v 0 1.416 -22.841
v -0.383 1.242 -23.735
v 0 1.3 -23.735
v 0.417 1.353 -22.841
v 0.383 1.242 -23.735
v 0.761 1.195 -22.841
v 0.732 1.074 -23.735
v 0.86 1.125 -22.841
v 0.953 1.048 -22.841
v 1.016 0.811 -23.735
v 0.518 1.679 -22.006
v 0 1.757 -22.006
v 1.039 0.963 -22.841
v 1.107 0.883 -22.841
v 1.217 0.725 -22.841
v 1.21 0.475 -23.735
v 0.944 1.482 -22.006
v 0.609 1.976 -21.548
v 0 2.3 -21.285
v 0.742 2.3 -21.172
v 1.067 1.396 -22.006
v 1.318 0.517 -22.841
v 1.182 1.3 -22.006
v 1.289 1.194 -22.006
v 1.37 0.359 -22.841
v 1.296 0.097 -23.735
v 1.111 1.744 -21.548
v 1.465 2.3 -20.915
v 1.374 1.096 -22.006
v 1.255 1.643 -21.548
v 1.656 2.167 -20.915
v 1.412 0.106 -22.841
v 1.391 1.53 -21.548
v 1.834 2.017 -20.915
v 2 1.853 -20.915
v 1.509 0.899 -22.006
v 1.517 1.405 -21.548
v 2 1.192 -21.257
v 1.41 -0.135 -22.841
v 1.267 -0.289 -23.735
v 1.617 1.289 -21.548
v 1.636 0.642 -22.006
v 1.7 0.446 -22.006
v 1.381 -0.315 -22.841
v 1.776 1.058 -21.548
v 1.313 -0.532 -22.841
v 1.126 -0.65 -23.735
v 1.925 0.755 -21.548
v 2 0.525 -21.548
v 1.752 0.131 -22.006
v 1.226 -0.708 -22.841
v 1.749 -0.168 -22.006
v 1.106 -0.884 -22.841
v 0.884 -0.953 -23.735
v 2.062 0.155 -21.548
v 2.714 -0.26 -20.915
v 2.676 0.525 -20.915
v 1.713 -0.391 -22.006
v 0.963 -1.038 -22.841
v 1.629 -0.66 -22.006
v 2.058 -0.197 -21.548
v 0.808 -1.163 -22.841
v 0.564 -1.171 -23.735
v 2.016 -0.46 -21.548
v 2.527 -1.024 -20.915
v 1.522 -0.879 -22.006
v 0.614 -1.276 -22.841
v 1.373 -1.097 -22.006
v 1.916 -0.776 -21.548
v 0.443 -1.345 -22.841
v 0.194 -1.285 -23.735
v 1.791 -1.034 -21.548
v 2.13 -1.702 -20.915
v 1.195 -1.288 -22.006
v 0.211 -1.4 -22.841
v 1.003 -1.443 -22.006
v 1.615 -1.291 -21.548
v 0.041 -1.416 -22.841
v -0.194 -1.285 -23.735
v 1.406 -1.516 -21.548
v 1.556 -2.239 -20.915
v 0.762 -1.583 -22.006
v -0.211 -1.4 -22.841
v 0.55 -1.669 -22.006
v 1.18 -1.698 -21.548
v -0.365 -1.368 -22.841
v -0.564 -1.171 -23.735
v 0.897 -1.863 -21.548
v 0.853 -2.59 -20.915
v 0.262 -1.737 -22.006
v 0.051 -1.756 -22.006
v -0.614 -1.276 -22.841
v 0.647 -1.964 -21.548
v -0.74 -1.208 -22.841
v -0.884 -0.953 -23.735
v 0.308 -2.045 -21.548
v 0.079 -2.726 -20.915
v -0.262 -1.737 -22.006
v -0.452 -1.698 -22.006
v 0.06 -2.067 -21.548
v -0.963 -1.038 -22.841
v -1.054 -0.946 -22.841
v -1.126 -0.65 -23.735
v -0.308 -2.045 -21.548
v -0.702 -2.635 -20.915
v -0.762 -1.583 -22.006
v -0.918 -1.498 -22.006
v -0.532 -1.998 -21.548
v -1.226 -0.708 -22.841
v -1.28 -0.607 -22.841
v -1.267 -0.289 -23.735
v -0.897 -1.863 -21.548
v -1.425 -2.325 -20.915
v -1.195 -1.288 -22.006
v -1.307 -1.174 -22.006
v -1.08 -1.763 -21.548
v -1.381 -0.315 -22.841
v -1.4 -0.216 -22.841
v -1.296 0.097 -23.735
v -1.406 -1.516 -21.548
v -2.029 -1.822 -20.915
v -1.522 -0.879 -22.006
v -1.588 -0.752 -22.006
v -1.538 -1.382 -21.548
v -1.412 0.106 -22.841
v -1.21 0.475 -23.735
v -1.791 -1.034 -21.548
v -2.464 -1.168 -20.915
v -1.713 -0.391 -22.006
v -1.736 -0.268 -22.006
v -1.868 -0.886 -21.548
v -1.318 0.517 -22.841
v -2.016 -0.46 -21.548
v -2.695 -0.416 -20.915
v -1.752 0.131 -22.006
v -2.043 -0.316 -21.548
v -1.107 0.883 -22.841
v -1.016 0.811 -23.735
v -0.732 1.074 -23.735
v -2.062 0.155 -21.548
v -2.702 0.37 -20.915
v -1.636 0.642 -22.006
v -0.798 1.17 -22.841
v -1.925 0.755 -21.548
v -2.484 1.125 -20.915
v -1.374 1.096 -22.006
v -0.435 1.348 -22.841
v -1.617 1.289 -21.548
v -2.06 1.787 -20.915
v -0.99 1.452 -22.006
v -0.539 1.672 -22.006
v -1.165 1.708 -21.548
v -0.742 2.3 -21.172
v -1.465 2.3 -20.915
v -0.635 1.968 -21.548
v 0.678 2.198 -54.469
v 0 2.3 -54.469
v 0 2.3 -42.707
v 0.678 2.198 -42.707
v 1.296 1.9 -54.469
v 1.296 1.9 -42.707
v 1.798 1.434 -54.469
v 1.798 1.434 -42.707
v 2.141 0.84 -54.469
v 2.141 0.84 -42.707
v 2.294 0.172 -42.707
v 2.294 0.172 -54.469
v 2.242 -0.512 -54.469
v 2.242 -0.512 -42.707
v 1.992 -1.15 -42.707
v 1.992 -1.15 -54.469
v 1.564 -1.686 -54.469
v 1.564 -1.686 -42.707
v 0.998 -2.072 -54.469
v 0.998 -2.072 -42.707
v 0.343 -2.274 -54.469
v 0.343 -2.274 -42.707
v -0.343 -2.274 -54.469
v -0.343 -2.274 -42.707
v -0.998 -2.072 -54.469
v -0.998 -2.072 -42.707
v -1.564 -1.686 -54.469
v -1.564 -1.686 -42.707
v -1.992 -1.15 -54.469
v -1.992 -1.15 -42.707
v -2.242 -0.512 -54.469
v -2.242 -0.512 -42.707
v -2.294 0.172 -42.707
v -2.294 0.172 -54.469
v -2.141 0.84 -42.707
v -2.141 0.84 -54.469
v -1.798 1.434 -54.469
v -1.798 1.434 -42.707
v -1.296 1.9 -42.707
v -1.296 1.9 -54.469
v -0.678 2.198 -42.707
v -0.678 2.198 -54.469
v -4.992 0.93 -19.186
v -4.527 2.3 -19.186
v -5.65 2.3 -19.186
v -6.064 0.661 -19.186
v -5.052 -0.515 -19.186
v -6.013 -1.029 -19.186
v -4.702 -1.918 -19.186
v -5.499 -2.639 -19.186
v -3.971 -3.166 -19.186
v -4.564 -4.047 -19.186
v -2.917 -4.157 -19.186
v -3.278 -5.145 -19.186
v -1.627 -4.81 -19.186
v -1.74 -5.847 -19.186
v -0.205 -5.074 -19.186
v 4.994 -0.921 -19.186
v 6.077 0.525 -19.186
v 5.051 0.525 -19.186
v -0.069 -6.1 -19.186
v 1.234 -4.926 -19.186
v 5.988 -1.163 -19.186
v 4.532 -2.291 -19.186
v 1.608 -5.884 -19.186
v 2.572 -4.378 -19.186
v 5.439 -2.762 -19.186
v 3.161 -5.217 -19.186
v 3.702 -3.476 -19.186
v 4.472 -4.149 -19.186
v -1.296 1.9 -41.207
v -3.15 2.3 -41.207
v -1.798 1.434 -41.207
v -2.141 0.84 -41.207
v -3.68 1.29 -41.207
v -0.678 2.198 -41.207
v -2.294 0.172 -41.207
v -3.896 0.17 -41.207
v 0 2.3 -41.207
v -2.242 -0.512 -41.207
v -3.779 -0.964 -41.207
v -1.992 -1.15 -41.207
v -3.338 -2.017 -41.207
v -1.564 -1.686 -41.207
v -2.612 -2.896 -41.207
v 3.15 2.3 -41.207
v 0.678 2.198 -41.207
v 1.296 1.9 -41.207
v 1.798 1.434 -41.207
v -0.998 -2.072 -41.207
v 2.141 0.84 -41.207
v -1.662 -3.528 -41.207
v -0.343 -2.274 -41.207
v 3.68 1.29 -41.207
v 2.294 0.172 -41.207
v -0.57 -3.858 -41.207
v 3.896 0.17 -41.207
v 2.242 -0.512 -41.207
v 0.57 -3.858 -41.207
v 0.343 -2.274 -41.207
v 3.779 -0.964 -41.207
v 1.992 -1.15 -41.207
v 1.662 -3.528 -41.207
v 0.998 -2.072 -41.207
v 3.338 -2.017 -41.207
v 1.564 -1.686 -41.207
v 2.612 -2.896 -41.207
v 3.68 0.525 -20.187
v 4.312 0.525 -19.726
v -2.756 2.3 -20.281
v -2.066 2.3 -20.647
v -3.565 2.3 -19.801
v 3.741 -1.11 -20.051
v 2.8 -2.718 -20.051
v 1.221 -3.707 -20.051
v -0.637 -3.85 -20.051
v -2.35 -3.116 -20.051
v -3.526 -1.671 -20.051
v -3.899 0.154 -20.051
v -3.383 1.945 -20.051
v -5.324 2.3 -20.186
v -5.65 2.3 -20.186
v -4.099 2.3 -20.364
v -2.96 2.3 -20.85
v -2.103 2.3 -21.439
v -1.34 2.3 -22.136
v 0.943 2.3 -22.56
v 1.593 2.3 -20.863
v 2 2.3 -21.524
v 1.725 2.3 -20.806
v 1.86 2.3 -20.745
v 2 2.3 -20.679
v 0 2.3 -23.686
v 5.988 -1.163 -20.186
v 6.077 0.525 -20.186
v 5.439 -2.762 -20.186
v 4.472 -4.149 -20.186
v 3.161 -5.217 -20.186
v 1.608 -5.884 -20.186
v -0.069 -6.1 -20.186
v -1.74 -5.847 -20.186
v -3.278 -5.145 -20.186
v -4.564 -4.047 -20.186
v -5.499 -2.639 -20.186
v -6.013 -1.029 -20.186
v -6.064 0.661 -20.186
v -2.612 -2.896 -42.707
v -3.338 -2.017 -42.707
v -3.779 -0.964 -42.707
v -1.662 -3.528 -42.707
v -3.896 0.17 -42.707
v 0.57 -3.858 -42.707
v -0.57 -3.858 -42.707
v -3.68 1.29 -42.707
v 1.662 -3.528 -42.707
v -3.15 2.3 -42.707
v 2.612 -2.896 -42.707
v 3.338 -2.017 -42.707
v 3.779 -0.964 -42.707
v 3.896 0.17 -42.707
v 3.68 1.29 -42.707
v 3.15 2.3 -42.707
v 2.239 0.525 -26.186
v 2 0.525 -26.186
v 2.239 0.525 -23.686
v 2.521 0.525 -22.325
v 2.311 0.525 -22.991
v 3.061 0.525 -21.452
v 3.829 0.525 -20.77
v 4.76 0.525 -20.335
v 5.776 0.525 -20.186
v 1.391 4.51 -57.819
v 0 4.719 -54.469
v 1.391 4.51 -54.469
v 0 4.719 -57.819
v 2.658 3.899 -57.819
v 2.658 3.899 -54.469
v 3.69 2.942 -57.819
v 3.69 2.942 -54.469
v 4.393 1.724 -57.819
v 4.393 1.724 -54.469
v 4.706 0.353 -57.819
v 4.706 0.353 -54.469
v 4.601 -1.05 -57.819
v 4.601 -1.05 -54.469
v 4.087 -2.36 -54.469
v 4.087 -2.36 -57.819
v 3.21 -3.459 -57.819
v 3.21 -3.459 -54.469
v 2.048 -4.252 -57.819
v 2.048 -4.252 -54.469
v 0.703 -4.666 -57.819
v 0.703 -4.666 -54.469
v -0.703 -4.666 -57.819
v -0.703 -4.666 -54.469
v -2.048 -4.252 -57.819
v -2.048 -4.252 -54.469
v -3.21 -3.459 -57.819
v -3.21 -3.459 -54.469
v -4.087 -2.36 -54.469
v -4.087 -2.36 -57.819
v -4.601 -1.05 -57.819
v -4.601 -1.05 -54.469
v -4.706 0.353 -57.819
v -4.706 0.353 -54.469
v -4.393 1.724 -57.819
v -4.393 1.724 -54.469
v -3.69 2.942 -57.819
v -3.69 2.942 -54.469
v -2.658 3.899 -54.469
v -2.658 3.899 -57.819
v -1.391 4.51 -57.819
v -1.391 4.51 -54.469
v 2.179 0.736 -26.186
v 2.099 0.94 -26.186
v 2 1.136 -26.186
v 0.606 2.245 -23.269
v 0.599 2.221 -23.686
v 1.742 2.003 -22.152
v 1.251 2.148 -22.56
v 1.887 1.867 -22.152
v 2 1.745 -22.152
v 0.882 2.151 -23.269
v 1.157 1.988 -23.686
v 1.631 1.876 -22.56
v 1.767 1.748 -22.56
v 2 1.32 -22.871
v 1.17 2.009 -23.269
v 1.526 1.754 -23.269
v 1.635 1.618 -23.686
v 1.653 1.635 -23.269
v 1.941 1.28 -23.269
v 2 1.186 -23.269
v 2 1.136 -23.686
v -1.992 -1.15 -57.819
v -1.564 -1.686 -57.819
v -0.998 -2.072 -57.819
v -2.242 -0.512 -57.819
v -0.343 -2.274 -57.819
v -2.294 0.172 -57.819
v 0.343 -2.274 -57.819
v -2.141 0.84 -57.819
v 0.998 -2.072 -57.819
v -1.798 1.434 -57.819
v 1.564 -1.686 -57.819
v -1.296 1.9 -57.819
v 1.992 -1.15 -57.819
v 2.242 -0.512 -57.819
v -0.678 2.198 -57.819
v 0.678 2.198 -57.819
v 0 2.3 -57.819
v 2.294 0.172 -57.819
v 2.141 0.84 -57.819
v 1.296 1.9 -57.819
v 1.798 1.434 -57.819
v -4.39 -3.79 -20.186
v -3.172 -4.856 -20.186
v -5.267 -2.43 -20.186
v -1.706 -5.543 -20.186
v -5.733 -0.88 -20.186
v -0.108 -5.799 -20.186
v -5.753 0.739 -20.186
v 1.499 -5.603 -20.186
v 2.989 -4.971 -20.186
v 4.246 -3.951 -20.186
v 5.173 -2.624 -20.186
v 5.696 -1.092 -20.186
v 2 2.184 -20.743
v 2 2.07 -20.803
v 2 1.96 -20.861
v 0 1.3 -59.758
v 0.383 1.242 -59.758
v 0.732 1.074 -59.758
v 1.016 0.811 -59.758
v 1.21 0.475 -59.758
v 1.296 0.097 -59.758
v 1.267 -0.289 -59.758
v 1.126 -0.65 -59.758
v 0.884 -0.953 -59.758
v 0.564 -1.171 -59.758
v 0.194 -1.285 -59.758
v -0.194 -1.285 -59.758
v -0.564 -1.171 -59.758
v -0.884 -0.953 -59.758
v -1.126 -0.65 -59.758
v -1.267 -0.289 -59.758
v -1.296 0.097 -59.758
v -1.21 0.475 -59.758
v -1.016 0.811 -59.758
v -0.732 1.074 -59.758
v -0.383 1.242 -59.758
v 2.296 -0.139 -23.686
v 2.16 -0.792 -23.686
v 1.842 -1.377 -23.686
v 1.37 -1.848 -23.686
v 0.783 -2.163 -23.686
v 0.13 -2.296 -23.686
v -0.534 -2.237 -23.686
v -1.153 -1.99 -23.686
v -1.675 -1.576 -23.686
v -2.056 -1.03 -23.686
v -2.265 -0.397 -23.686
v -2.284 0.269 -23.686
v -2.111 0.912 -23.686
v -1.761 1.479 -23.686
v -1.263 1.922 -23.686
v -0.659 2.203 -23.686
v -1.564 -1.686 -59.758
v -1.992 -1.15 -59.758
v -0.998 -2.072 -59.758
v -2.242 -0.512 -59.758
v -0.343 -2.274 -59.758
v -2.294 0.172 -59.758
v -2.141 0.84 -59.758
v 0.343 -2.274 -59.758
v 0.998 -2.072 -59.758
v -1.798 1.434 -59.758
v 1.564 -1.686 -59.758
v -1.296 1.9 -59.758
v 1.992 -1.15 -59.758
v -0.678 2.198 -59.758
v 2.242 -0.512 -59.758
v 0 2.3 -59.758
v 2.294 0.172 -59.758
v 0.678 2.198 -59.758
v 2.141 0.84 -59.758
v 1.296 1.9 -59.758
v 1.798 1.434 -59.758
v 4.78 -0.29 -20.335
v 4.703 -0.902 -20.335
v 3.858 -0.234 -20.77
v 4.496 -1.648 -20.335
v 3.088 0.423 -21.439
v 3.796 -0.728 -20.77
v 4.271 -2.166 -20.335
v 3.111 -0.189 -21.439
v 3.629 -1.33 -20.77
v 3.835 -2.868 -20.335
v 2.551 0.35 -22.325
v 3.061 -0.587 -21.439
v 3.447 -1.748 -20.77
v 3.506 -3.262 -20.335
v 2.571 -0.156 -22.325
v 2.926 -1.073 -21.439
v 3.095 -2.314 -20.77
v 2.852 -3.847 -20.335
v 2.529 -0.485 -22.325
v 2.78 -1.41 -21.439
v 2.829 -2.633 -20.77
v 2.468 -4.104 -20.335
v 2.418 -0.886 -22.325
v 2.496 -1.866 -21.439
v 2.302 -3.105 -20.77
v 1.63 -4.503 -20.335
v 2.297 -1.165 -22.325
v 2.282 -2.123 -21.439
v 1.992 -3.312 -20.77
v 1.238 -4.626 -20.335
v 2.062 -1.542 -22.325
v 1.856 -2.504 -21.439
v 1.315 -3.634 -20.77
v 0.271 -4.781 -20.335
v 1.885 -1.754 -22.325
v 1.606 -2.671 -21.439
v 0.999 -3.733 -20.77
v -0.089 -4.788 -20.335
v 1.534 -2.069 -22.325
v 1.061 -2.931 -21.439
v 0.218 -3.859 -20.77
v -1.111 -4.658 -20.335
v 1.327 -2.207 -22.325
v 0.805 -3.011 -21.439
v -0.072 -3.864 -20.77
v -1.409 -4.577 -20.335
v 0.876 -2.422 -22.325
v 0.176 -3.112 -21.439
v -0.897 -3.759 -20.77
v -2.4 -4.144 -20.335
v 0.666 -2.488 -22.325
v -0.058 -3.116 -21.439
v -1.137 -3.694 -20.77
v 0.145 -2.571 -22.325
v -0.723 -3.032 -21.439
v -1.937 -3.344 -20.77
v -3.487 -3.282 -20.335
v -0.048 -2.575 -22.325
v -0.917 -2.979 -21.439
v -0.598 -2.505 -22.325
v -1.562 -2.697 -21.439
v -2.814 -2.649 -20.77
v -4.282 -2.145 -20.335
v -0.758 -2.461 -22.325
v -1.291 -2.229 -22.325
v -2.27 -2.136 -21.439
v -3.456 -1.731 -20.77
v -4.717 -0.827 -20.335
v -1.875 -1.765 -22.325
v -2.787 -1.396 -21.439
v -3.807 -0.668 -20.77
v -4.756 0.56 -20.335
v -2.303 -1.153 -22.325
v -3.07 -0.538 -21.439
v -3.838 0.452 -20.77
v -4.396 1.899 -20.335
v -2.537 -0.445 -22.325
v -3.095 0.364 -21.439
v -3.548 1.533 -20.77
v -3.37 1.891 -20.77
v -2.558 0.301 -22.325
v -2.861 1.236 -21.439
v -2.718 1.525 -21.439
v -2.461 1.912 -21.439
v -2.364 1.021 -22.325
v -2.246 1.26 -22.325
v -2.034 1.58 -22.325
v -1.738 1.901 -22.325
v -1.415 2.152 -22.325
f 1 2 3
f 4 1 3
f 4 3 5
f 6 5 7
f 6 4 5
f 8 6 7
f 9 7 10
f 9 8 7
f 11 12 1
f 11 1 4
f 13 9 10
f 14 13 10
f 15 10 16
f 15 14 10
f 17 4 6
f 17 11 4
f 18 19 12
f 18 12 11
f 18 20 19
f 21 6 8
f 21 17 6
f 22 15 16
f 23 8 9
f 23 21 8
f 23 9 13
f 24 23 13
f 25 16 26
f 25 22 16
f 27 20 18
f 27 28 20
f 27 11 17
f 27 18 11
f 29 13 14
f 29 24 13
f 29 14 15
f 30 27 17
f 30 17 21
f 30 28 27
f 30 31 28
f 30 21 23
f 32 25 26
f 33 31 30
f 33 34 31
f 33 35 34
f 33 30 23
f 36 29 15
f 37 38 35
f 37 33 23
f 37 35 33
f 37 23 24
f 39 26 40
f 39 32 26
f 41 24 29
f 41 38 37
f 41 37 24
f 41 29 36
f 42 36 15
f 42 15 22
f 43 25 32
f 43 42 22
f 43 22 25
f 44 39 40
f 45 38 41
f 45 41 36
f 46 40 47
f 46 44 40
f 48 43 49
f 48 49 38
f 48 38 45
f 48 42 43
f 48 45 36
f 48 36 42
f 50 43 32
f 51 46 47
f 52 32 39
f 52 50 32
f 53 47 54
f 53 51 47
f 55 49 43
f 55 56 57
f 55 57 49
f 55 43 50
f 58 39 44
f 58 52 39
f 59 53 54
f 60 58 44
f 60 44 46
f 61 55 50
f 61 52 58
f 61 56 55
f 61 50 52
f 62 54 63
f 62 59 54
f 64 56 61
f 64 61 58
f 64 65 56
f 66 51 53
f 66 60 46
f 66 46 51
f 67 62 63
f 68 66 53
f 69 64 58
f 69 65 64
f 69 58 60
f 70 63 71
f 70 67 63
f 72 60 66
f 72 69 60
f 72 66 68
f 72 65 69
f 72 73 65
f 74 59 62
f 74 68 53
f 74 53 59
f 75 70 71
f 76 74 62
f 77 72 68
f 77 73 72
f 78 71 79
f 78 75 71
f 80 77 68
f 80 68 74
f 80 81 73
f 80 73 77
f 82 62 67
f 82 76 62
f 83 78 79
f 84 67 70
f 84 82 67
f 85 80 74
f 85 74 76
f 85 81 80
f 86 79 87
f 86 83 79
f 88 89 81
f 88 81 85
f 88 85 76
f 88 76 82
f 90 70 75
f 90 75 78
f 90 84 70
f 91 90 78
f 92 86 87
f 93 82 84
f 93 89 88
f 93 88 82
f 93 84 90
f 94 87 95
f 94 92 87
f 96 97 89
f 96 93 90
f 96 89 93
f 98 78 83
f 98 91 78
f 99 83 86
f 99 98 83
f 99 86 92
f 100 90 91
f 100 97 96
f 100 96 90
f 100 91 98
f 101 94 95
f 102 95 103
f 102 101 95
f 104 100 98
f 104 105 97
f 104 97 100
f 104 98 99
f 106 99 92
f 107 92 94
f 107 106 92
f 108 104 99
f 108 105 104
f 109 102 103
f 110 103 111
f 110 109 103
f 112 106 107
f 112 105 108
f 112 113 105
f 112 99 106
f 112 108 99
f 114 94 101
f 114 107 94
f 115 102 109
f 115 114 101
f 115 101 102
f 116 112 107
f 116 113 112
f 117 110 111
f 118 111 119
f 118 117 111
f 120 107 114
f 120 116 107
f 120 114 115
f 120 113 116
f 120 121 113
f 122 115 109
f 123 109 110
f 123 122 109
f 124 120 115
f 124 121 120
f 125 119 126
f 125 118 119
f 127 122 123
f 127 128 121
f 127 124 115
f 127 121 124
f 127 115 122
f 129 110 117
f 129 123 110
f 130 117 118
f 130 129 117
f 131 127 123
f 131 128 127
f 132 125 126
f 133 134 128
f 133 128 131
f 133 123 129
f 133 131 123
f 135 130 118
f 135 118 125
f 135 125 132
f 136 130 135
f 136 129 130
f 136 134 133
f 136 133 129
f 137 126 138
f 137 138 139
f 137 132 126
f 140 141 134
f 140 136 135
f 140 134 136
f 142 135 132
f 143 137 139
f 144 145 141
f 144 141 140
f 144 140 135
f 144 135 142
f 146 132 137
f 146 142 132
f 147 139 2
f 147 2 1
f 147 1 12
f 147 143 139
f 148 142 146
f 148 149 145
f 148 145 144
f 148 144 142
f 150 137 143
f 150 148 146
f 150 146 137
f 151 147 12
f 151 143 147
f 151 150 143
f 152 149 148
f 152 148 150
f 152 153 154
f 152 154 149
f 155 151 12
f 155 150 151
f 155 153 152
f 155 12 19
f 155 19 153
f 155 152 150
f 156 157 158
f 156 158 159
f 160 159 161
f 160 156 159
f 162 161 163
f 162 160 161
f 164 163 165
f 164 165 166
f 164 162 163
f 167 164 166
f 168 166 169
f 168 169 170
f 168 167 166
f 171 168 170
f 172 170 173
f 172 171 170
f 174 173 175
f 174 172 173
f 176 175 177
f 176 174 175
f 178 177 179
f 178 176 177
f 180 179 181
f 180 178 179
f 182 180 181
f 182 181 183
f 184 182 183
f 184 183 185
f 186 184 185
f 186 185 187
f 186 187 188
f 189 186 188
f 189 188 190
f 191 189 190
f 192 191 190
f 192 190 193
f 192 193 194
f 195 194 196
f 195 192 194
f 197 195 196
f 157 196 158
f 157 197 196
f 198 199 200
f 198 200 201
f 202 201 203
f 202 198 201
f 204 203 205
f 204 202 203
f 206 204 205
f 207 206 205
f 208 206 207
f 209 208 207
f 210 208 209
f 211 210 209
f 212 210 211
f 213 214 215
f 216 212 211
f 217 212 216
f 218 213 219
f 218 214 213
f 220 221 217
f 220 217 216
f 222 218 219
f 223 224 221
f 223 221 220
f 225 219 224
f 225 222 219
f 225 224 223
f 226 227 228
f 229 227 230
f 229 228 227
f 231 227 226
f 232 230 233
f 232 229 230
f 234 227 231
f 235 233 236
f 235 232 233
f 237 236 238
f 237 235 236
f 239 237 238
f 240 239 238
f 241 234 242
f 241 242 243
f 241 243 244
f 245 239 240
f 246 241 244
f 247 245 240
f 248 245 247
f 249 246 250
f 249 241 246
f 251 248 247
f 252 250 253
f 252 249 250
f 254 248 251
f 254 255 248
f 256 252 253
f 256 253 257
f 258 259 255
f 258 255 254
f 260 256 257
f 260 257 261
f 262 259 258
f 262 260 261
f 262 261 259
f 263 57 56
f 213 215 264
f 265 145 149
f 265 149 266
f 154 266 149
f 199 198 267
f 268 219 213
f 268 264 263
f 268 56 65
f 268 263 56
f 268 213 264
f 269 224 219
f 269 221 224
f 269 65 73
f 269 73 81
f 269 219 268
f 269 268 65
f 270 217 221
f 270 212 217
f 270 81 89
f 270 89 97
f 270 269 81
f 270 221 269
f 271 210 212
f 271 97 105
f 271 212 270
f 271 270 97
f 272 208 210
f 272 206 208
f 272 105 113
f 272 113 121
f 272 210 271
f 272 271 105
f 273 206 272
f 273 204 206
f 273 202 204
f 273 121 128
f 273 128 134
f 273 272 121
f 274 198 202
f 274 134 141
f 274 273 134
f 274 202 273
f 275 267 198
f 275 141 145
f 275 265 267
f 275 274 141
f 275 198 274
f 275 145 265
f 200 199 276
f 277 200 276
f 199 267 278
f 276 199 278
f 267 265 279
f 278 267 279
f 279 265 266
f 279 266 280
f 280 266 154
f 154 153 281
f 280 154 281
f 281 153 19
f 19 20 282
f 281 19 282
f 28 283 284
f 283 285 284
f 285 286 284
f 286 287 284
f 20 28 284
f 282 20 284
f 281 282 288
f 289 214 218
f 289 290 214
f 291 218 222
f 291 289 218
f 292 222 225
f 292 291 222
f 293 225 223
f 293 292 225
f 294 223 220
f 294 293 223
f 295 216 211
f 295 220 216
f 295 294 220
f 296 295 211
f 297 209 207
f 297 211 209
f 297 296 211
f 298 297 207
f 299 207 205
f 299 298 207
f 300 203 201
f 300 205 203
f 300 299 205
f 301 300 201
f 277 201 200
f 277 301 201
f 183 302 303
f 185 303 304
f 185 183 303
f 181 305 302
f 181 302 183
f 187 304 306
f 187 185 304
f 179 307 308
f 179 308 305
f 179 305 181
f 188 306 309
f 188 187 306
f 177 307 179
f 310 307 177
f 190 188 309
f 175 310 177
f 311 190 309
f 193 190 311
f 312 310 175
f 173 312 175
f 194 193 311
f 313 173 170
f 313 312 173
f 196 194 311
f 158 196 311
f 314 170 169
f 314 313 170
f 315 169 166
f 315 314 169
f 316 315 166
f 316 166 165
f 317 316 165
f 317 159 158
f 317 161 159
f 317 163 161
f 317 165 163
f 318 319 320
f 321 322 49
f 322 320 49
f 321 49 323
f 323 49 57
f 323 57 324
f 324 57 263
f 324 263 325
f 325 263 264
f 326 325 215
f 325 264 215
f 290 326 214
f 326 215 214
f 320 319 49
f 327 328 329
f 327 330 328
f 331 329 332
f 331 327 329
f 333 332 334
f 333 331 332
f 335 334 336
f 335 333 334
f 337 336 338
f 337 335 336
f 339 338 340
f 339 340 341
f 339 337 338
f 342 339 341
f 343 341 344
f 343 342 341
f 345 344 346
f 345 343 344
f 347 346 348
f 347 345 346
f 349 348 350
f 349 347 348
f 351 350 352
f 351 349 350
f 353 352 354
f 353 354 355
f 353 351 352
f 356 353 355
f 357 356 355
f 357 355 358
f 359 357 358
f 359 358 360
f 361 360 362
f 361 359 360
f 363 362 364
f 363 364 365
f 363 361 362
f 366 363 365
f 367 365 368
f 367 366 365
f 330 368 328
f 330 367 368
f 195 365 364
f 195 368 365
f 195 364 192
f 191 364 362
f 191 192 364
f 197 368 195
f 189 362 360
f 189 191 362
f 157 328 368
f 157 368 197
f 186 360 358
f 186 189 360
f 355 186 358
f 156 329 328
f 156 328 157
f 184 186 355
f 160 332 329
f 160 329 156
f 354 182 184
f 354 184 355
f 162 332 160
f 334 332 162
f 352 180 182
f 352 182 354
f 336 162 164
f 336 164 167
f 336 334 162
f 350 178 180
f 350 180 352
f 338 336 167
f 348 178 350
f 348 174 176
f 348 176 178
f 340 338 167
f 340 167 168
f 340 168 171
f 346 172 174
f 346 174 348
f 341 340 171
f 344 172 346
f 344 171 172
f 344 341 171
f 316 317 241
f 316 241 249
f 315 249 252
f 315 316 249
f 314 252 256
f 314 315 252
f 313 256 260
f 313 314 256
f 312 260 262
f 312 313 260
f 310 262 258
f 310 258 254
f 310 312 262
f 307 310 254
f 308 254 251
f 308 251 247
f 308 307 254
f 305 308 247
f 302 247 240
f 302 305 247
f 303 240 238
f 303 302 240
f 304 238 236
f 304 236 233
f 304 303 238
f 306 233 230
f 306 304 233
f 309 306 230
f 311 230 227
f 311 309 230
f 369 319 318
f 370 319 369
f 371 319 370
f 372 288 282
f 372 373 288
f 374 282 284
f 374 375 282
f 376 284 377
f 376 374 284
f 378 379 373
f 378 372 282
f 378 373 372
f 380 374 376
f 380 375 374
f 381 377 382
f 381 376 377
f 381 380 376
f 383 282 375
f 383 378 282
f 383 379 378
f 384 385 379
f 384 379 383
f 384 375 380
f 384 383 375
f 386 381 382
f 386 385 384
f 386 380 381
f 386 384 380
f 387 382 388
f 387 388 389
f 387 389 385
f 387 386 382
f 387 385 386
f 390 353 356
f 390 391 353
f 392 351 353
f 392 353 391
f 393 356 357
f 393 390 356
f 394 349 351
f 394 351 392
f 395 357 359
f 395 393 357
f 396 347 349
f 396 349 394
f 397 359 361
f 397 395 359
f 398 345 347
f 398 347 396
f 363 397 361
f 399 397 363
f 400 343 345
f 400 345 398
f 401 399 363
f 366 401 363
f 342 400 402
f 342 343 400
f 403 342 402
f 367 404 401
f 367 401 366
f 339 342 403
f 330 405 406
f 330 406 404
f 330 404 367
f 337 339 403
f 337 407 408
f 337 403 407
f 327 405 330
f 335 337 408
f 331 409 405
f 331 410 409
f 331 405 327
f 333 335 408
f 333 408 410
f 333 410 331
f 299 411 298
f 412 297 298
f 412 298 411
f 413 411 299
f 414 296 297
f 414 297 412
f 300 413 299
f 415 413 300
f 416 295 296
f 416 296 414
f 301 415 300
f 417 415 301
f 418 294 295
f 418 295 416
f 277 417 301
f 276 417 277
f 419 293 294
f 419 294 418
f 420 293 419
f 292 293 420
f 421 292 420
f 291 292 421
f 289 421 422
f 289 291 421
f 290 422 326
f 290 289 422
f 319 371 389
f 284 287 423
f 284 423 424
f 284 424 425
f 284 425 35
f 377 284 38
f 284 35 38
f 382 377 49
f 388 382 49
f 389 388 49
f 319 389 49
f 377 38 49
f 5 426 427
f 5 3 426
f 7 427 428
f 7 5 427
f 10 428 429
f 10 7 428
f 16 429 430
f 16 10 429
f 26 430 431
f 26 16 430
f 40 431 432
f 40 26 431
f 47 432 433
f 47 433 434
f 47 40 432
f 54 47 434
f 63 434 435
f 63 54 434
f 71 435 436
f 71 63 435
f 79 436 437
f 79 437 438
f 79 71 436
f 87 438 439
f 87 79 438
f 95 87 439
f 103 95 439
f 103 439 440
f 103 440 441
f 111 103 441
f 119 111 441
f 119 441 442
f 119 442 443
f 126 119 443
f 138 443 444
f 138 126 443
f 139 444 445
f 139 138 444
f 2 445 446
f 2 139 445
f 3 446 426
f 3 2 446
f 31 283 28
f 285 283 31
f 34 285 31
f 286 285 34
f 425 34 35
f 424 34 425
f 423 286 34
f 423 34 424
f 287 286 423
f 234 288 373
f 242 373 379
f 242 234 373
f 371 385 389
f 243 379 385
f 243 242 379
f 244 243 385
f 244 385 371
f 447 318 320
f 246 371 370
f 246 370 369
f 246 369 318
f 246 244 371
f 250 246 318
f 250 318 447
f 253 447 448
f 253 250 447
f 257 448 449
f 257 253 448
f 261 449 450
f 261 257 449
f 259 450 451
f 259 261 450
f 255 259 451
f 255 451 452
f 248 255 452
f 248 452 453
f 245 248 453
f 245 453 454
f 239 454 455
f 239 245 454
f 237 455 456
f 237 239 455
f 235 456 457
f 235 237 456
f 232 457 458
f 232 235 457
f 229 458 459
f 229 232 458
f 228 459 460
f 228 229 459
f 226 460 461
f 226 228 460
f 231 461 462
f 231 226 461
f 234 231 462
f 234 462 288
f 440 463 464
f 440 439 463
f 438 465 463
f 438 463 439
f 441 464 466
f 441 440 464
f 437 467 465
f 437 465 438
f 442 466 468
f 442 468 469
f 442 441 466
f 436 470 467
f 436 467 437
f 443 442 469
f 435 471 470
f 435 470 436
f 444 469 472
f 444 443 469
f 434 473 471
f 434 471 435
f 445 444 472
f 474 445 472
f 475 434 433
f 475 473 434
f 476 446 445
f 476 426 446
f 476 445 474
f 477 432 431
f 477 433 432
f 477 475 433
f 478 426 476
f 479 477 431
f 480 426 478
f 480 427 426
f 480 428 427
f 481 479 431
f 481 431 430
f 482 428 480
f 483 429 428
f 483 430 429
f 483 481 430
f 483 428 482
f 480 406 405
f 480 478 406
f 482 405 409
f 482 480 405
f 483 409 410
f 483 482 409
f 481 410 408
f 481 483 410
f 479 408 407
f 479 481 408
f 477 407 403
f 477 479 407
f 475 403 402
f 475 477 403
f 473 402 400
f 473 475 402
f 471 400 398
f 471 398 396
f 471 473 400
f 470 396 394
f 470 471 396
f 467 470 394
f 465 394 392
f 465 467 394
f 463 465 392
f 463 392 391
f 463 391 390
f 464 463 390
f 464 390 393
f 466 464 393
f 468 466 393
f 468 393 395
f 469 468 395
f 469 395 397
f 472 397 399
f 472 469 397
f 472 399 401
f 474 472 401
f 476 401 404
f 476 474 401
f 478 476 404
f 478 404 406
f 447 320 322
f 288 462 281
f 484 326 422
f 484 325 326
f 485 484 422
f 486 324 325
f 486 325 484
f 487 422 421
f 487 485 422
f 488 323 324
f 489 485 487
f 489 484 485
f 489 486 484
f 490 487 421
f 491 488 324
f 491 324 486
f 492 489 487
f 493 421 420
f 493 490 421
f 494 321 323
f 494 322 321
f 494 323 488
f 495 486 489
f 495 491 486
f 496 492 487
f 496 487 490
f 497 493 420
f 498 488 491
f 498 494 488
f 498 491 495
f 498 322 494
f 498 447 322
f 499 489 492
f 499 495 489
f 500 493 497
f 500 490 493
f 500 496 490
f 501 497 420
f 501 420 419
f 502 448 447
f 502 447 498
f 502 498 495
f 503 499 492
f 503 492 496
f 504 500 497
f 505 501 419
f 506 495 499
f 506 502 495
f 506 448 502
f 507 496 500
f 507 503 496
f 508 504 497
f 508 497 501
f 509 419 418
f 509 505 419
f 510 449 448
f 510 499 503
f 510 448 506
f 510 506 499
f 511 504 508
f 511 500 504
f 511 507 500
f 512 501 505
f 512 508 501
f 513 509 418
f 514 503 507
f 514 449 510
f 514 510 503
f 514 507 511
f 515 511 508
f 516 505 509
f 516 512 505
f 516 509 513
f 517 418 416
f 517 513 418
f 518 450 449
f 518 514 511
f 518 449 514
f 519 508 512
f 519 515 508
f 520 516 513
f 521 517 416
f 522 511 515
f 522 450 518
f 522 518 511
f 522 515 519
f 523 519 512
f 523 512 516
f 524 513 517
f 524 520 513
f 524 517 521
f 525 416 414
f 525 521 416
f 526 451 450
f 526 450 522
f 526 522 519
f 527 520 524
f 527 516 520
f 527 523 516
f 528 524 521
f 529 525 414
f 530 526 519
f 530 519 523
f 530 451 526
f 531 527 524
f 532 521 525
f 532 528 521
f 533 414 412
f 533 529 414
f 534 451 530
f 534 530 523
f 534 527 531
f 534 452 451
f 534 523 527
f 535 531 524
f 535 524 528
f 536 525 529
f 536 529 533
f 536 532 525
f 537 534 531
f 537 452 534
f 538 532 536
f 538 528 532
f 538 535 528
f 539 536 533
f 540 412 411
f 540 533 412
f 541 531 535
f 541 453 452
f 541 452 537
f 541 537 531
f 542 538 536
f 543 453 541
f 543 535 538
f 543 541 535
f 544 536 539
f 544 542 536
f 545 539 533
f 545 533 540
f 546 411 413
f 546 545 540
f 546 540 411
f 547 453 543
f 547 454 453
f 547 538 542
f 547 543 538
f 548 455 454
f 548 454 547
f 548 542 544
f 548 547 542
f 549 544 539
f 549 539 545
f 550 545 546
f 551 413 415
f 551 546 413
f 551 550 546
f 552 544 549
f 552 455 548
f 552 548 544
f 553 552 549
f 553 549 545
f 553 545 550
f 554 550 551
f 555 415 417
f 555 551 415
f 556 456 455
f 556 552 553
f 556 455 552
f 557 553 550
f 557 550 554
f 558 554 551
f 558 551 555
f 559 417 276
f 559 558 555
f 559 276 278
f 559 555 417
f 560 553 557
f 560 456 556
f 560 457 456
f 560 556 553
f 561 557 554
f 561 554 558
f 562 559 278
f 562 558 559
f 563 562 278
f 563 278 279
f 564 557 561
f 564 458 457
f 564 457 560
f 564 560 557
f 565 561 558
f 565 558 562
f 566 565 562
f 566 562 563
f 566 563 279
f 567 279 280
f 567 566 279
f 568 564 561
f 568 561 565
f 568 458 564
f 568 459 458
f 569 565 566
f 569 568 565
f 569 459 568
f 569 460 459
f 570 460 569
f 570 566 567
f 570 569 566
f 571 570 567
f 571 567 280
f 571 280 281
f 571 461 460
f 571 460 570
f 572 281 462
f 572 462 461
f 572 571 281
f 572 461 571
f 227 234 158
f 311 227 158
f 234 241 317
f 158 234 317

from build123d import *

# Parameters (mm, degrees)
CUT_EXTRUDE1_DEPTH      = 7
SKETCH3_W               = 26.933594661
SKETCH3_H               = 5.726695828
CUT_EXTRUDE2_DEPTH      = 7.1
CUT_EXTRUDE2_DEPTH_BACK = 7.1


with BuildPart() as part:
    # Sketch1 → Revolve1 (revolve)
    with BuildSketch(Plane(origin=(0, 0, 0), x_dir=(0, 0, -1), z_dir=(1, 0, 0))):
        with BuildLine():
            Line((19.186178752, 5.078211692), (19.186178752, 6.1))
            Line((19.186178752, 6.1), (20.186178752, 6.1))
            Line((20.186178752, 6.1), (20.186178752, 5.8))
            ThreePointArc((20.186178752, 5.8), (21.211305018, 3.325126266), (23.686178752, 2.3))
            Line((23.686178752, 2.3), (41.207308429, 2.3))
            Line((41.207308429, 2.3), (41.207308429, 3.9))
            Line((41.207308429, 3.9), (42.707308429, 3.9))
            Line((42.707308429, 3.9), (42.707308429, 2.3))
            Line((42.707308429, 2.3), (54.469152884, 2.3))
            Line((54.469152884, 2.3), (54.469152884, 4.719165839))
            Line((54.469152884, 4.719165839), (57.819152884, 4.719165839))
            Line((57.819152884, 4.719165839), (57.819152884, 2.3))
            Line((57.819152884, 2.3), (59.757795324, 2.3))
            Line((59.757795324, 2.3), (59.757795324, 1.3))
            Line((59.757795324, 1.3), (23.73491848, 1.3))
            ThreePointArc((23.73491848, 1.3), (22.154791951, 1.676988608), (20.915059537, 2.72674277))
            Line((20.915059537, 2.72674277), (19.186178752, 5.078211692))
        make_face()
    revolve(axis=Axis((0, 0, 0), (0, 0, -1)))

    # Sketch2 → Cut-Extrude1 (cut)
    with BuildSketch(Plane.XY.offset(-19.186178752)):
        Polygon((2, 6), (2, 0.524681536), (7.756224258, 0.524681536), (7.708002274, 5.9580813), align=None)
    extrude(amount=-CUT_EXTRUDE1_DEPTH, mode=Mode.SUBTRACT)

    # Sketch3 → Cut-Extrude2 (cut, two sides)
    with BuildSketch(Plane(origin=(0, 0, 0), x_dir=(0, 0, -1), z_dir=(1, 0, 0))) as cut_extrude2_sk:
        with Locations((31.133671125, 5.163347914)):
            Rectangle(SKETCH3_W, SKETCH3_H)
    extrude(amount=CUT_EXTRUDE2_DEPTH, mode=Mode.SUBTRACT)
    extrude(cut_extrude2_sk.sketch, amount=-CUT_EXTRUDE2_DEPTH_BACK, mode=Mode.SUBTRACT)


solid = part.part
